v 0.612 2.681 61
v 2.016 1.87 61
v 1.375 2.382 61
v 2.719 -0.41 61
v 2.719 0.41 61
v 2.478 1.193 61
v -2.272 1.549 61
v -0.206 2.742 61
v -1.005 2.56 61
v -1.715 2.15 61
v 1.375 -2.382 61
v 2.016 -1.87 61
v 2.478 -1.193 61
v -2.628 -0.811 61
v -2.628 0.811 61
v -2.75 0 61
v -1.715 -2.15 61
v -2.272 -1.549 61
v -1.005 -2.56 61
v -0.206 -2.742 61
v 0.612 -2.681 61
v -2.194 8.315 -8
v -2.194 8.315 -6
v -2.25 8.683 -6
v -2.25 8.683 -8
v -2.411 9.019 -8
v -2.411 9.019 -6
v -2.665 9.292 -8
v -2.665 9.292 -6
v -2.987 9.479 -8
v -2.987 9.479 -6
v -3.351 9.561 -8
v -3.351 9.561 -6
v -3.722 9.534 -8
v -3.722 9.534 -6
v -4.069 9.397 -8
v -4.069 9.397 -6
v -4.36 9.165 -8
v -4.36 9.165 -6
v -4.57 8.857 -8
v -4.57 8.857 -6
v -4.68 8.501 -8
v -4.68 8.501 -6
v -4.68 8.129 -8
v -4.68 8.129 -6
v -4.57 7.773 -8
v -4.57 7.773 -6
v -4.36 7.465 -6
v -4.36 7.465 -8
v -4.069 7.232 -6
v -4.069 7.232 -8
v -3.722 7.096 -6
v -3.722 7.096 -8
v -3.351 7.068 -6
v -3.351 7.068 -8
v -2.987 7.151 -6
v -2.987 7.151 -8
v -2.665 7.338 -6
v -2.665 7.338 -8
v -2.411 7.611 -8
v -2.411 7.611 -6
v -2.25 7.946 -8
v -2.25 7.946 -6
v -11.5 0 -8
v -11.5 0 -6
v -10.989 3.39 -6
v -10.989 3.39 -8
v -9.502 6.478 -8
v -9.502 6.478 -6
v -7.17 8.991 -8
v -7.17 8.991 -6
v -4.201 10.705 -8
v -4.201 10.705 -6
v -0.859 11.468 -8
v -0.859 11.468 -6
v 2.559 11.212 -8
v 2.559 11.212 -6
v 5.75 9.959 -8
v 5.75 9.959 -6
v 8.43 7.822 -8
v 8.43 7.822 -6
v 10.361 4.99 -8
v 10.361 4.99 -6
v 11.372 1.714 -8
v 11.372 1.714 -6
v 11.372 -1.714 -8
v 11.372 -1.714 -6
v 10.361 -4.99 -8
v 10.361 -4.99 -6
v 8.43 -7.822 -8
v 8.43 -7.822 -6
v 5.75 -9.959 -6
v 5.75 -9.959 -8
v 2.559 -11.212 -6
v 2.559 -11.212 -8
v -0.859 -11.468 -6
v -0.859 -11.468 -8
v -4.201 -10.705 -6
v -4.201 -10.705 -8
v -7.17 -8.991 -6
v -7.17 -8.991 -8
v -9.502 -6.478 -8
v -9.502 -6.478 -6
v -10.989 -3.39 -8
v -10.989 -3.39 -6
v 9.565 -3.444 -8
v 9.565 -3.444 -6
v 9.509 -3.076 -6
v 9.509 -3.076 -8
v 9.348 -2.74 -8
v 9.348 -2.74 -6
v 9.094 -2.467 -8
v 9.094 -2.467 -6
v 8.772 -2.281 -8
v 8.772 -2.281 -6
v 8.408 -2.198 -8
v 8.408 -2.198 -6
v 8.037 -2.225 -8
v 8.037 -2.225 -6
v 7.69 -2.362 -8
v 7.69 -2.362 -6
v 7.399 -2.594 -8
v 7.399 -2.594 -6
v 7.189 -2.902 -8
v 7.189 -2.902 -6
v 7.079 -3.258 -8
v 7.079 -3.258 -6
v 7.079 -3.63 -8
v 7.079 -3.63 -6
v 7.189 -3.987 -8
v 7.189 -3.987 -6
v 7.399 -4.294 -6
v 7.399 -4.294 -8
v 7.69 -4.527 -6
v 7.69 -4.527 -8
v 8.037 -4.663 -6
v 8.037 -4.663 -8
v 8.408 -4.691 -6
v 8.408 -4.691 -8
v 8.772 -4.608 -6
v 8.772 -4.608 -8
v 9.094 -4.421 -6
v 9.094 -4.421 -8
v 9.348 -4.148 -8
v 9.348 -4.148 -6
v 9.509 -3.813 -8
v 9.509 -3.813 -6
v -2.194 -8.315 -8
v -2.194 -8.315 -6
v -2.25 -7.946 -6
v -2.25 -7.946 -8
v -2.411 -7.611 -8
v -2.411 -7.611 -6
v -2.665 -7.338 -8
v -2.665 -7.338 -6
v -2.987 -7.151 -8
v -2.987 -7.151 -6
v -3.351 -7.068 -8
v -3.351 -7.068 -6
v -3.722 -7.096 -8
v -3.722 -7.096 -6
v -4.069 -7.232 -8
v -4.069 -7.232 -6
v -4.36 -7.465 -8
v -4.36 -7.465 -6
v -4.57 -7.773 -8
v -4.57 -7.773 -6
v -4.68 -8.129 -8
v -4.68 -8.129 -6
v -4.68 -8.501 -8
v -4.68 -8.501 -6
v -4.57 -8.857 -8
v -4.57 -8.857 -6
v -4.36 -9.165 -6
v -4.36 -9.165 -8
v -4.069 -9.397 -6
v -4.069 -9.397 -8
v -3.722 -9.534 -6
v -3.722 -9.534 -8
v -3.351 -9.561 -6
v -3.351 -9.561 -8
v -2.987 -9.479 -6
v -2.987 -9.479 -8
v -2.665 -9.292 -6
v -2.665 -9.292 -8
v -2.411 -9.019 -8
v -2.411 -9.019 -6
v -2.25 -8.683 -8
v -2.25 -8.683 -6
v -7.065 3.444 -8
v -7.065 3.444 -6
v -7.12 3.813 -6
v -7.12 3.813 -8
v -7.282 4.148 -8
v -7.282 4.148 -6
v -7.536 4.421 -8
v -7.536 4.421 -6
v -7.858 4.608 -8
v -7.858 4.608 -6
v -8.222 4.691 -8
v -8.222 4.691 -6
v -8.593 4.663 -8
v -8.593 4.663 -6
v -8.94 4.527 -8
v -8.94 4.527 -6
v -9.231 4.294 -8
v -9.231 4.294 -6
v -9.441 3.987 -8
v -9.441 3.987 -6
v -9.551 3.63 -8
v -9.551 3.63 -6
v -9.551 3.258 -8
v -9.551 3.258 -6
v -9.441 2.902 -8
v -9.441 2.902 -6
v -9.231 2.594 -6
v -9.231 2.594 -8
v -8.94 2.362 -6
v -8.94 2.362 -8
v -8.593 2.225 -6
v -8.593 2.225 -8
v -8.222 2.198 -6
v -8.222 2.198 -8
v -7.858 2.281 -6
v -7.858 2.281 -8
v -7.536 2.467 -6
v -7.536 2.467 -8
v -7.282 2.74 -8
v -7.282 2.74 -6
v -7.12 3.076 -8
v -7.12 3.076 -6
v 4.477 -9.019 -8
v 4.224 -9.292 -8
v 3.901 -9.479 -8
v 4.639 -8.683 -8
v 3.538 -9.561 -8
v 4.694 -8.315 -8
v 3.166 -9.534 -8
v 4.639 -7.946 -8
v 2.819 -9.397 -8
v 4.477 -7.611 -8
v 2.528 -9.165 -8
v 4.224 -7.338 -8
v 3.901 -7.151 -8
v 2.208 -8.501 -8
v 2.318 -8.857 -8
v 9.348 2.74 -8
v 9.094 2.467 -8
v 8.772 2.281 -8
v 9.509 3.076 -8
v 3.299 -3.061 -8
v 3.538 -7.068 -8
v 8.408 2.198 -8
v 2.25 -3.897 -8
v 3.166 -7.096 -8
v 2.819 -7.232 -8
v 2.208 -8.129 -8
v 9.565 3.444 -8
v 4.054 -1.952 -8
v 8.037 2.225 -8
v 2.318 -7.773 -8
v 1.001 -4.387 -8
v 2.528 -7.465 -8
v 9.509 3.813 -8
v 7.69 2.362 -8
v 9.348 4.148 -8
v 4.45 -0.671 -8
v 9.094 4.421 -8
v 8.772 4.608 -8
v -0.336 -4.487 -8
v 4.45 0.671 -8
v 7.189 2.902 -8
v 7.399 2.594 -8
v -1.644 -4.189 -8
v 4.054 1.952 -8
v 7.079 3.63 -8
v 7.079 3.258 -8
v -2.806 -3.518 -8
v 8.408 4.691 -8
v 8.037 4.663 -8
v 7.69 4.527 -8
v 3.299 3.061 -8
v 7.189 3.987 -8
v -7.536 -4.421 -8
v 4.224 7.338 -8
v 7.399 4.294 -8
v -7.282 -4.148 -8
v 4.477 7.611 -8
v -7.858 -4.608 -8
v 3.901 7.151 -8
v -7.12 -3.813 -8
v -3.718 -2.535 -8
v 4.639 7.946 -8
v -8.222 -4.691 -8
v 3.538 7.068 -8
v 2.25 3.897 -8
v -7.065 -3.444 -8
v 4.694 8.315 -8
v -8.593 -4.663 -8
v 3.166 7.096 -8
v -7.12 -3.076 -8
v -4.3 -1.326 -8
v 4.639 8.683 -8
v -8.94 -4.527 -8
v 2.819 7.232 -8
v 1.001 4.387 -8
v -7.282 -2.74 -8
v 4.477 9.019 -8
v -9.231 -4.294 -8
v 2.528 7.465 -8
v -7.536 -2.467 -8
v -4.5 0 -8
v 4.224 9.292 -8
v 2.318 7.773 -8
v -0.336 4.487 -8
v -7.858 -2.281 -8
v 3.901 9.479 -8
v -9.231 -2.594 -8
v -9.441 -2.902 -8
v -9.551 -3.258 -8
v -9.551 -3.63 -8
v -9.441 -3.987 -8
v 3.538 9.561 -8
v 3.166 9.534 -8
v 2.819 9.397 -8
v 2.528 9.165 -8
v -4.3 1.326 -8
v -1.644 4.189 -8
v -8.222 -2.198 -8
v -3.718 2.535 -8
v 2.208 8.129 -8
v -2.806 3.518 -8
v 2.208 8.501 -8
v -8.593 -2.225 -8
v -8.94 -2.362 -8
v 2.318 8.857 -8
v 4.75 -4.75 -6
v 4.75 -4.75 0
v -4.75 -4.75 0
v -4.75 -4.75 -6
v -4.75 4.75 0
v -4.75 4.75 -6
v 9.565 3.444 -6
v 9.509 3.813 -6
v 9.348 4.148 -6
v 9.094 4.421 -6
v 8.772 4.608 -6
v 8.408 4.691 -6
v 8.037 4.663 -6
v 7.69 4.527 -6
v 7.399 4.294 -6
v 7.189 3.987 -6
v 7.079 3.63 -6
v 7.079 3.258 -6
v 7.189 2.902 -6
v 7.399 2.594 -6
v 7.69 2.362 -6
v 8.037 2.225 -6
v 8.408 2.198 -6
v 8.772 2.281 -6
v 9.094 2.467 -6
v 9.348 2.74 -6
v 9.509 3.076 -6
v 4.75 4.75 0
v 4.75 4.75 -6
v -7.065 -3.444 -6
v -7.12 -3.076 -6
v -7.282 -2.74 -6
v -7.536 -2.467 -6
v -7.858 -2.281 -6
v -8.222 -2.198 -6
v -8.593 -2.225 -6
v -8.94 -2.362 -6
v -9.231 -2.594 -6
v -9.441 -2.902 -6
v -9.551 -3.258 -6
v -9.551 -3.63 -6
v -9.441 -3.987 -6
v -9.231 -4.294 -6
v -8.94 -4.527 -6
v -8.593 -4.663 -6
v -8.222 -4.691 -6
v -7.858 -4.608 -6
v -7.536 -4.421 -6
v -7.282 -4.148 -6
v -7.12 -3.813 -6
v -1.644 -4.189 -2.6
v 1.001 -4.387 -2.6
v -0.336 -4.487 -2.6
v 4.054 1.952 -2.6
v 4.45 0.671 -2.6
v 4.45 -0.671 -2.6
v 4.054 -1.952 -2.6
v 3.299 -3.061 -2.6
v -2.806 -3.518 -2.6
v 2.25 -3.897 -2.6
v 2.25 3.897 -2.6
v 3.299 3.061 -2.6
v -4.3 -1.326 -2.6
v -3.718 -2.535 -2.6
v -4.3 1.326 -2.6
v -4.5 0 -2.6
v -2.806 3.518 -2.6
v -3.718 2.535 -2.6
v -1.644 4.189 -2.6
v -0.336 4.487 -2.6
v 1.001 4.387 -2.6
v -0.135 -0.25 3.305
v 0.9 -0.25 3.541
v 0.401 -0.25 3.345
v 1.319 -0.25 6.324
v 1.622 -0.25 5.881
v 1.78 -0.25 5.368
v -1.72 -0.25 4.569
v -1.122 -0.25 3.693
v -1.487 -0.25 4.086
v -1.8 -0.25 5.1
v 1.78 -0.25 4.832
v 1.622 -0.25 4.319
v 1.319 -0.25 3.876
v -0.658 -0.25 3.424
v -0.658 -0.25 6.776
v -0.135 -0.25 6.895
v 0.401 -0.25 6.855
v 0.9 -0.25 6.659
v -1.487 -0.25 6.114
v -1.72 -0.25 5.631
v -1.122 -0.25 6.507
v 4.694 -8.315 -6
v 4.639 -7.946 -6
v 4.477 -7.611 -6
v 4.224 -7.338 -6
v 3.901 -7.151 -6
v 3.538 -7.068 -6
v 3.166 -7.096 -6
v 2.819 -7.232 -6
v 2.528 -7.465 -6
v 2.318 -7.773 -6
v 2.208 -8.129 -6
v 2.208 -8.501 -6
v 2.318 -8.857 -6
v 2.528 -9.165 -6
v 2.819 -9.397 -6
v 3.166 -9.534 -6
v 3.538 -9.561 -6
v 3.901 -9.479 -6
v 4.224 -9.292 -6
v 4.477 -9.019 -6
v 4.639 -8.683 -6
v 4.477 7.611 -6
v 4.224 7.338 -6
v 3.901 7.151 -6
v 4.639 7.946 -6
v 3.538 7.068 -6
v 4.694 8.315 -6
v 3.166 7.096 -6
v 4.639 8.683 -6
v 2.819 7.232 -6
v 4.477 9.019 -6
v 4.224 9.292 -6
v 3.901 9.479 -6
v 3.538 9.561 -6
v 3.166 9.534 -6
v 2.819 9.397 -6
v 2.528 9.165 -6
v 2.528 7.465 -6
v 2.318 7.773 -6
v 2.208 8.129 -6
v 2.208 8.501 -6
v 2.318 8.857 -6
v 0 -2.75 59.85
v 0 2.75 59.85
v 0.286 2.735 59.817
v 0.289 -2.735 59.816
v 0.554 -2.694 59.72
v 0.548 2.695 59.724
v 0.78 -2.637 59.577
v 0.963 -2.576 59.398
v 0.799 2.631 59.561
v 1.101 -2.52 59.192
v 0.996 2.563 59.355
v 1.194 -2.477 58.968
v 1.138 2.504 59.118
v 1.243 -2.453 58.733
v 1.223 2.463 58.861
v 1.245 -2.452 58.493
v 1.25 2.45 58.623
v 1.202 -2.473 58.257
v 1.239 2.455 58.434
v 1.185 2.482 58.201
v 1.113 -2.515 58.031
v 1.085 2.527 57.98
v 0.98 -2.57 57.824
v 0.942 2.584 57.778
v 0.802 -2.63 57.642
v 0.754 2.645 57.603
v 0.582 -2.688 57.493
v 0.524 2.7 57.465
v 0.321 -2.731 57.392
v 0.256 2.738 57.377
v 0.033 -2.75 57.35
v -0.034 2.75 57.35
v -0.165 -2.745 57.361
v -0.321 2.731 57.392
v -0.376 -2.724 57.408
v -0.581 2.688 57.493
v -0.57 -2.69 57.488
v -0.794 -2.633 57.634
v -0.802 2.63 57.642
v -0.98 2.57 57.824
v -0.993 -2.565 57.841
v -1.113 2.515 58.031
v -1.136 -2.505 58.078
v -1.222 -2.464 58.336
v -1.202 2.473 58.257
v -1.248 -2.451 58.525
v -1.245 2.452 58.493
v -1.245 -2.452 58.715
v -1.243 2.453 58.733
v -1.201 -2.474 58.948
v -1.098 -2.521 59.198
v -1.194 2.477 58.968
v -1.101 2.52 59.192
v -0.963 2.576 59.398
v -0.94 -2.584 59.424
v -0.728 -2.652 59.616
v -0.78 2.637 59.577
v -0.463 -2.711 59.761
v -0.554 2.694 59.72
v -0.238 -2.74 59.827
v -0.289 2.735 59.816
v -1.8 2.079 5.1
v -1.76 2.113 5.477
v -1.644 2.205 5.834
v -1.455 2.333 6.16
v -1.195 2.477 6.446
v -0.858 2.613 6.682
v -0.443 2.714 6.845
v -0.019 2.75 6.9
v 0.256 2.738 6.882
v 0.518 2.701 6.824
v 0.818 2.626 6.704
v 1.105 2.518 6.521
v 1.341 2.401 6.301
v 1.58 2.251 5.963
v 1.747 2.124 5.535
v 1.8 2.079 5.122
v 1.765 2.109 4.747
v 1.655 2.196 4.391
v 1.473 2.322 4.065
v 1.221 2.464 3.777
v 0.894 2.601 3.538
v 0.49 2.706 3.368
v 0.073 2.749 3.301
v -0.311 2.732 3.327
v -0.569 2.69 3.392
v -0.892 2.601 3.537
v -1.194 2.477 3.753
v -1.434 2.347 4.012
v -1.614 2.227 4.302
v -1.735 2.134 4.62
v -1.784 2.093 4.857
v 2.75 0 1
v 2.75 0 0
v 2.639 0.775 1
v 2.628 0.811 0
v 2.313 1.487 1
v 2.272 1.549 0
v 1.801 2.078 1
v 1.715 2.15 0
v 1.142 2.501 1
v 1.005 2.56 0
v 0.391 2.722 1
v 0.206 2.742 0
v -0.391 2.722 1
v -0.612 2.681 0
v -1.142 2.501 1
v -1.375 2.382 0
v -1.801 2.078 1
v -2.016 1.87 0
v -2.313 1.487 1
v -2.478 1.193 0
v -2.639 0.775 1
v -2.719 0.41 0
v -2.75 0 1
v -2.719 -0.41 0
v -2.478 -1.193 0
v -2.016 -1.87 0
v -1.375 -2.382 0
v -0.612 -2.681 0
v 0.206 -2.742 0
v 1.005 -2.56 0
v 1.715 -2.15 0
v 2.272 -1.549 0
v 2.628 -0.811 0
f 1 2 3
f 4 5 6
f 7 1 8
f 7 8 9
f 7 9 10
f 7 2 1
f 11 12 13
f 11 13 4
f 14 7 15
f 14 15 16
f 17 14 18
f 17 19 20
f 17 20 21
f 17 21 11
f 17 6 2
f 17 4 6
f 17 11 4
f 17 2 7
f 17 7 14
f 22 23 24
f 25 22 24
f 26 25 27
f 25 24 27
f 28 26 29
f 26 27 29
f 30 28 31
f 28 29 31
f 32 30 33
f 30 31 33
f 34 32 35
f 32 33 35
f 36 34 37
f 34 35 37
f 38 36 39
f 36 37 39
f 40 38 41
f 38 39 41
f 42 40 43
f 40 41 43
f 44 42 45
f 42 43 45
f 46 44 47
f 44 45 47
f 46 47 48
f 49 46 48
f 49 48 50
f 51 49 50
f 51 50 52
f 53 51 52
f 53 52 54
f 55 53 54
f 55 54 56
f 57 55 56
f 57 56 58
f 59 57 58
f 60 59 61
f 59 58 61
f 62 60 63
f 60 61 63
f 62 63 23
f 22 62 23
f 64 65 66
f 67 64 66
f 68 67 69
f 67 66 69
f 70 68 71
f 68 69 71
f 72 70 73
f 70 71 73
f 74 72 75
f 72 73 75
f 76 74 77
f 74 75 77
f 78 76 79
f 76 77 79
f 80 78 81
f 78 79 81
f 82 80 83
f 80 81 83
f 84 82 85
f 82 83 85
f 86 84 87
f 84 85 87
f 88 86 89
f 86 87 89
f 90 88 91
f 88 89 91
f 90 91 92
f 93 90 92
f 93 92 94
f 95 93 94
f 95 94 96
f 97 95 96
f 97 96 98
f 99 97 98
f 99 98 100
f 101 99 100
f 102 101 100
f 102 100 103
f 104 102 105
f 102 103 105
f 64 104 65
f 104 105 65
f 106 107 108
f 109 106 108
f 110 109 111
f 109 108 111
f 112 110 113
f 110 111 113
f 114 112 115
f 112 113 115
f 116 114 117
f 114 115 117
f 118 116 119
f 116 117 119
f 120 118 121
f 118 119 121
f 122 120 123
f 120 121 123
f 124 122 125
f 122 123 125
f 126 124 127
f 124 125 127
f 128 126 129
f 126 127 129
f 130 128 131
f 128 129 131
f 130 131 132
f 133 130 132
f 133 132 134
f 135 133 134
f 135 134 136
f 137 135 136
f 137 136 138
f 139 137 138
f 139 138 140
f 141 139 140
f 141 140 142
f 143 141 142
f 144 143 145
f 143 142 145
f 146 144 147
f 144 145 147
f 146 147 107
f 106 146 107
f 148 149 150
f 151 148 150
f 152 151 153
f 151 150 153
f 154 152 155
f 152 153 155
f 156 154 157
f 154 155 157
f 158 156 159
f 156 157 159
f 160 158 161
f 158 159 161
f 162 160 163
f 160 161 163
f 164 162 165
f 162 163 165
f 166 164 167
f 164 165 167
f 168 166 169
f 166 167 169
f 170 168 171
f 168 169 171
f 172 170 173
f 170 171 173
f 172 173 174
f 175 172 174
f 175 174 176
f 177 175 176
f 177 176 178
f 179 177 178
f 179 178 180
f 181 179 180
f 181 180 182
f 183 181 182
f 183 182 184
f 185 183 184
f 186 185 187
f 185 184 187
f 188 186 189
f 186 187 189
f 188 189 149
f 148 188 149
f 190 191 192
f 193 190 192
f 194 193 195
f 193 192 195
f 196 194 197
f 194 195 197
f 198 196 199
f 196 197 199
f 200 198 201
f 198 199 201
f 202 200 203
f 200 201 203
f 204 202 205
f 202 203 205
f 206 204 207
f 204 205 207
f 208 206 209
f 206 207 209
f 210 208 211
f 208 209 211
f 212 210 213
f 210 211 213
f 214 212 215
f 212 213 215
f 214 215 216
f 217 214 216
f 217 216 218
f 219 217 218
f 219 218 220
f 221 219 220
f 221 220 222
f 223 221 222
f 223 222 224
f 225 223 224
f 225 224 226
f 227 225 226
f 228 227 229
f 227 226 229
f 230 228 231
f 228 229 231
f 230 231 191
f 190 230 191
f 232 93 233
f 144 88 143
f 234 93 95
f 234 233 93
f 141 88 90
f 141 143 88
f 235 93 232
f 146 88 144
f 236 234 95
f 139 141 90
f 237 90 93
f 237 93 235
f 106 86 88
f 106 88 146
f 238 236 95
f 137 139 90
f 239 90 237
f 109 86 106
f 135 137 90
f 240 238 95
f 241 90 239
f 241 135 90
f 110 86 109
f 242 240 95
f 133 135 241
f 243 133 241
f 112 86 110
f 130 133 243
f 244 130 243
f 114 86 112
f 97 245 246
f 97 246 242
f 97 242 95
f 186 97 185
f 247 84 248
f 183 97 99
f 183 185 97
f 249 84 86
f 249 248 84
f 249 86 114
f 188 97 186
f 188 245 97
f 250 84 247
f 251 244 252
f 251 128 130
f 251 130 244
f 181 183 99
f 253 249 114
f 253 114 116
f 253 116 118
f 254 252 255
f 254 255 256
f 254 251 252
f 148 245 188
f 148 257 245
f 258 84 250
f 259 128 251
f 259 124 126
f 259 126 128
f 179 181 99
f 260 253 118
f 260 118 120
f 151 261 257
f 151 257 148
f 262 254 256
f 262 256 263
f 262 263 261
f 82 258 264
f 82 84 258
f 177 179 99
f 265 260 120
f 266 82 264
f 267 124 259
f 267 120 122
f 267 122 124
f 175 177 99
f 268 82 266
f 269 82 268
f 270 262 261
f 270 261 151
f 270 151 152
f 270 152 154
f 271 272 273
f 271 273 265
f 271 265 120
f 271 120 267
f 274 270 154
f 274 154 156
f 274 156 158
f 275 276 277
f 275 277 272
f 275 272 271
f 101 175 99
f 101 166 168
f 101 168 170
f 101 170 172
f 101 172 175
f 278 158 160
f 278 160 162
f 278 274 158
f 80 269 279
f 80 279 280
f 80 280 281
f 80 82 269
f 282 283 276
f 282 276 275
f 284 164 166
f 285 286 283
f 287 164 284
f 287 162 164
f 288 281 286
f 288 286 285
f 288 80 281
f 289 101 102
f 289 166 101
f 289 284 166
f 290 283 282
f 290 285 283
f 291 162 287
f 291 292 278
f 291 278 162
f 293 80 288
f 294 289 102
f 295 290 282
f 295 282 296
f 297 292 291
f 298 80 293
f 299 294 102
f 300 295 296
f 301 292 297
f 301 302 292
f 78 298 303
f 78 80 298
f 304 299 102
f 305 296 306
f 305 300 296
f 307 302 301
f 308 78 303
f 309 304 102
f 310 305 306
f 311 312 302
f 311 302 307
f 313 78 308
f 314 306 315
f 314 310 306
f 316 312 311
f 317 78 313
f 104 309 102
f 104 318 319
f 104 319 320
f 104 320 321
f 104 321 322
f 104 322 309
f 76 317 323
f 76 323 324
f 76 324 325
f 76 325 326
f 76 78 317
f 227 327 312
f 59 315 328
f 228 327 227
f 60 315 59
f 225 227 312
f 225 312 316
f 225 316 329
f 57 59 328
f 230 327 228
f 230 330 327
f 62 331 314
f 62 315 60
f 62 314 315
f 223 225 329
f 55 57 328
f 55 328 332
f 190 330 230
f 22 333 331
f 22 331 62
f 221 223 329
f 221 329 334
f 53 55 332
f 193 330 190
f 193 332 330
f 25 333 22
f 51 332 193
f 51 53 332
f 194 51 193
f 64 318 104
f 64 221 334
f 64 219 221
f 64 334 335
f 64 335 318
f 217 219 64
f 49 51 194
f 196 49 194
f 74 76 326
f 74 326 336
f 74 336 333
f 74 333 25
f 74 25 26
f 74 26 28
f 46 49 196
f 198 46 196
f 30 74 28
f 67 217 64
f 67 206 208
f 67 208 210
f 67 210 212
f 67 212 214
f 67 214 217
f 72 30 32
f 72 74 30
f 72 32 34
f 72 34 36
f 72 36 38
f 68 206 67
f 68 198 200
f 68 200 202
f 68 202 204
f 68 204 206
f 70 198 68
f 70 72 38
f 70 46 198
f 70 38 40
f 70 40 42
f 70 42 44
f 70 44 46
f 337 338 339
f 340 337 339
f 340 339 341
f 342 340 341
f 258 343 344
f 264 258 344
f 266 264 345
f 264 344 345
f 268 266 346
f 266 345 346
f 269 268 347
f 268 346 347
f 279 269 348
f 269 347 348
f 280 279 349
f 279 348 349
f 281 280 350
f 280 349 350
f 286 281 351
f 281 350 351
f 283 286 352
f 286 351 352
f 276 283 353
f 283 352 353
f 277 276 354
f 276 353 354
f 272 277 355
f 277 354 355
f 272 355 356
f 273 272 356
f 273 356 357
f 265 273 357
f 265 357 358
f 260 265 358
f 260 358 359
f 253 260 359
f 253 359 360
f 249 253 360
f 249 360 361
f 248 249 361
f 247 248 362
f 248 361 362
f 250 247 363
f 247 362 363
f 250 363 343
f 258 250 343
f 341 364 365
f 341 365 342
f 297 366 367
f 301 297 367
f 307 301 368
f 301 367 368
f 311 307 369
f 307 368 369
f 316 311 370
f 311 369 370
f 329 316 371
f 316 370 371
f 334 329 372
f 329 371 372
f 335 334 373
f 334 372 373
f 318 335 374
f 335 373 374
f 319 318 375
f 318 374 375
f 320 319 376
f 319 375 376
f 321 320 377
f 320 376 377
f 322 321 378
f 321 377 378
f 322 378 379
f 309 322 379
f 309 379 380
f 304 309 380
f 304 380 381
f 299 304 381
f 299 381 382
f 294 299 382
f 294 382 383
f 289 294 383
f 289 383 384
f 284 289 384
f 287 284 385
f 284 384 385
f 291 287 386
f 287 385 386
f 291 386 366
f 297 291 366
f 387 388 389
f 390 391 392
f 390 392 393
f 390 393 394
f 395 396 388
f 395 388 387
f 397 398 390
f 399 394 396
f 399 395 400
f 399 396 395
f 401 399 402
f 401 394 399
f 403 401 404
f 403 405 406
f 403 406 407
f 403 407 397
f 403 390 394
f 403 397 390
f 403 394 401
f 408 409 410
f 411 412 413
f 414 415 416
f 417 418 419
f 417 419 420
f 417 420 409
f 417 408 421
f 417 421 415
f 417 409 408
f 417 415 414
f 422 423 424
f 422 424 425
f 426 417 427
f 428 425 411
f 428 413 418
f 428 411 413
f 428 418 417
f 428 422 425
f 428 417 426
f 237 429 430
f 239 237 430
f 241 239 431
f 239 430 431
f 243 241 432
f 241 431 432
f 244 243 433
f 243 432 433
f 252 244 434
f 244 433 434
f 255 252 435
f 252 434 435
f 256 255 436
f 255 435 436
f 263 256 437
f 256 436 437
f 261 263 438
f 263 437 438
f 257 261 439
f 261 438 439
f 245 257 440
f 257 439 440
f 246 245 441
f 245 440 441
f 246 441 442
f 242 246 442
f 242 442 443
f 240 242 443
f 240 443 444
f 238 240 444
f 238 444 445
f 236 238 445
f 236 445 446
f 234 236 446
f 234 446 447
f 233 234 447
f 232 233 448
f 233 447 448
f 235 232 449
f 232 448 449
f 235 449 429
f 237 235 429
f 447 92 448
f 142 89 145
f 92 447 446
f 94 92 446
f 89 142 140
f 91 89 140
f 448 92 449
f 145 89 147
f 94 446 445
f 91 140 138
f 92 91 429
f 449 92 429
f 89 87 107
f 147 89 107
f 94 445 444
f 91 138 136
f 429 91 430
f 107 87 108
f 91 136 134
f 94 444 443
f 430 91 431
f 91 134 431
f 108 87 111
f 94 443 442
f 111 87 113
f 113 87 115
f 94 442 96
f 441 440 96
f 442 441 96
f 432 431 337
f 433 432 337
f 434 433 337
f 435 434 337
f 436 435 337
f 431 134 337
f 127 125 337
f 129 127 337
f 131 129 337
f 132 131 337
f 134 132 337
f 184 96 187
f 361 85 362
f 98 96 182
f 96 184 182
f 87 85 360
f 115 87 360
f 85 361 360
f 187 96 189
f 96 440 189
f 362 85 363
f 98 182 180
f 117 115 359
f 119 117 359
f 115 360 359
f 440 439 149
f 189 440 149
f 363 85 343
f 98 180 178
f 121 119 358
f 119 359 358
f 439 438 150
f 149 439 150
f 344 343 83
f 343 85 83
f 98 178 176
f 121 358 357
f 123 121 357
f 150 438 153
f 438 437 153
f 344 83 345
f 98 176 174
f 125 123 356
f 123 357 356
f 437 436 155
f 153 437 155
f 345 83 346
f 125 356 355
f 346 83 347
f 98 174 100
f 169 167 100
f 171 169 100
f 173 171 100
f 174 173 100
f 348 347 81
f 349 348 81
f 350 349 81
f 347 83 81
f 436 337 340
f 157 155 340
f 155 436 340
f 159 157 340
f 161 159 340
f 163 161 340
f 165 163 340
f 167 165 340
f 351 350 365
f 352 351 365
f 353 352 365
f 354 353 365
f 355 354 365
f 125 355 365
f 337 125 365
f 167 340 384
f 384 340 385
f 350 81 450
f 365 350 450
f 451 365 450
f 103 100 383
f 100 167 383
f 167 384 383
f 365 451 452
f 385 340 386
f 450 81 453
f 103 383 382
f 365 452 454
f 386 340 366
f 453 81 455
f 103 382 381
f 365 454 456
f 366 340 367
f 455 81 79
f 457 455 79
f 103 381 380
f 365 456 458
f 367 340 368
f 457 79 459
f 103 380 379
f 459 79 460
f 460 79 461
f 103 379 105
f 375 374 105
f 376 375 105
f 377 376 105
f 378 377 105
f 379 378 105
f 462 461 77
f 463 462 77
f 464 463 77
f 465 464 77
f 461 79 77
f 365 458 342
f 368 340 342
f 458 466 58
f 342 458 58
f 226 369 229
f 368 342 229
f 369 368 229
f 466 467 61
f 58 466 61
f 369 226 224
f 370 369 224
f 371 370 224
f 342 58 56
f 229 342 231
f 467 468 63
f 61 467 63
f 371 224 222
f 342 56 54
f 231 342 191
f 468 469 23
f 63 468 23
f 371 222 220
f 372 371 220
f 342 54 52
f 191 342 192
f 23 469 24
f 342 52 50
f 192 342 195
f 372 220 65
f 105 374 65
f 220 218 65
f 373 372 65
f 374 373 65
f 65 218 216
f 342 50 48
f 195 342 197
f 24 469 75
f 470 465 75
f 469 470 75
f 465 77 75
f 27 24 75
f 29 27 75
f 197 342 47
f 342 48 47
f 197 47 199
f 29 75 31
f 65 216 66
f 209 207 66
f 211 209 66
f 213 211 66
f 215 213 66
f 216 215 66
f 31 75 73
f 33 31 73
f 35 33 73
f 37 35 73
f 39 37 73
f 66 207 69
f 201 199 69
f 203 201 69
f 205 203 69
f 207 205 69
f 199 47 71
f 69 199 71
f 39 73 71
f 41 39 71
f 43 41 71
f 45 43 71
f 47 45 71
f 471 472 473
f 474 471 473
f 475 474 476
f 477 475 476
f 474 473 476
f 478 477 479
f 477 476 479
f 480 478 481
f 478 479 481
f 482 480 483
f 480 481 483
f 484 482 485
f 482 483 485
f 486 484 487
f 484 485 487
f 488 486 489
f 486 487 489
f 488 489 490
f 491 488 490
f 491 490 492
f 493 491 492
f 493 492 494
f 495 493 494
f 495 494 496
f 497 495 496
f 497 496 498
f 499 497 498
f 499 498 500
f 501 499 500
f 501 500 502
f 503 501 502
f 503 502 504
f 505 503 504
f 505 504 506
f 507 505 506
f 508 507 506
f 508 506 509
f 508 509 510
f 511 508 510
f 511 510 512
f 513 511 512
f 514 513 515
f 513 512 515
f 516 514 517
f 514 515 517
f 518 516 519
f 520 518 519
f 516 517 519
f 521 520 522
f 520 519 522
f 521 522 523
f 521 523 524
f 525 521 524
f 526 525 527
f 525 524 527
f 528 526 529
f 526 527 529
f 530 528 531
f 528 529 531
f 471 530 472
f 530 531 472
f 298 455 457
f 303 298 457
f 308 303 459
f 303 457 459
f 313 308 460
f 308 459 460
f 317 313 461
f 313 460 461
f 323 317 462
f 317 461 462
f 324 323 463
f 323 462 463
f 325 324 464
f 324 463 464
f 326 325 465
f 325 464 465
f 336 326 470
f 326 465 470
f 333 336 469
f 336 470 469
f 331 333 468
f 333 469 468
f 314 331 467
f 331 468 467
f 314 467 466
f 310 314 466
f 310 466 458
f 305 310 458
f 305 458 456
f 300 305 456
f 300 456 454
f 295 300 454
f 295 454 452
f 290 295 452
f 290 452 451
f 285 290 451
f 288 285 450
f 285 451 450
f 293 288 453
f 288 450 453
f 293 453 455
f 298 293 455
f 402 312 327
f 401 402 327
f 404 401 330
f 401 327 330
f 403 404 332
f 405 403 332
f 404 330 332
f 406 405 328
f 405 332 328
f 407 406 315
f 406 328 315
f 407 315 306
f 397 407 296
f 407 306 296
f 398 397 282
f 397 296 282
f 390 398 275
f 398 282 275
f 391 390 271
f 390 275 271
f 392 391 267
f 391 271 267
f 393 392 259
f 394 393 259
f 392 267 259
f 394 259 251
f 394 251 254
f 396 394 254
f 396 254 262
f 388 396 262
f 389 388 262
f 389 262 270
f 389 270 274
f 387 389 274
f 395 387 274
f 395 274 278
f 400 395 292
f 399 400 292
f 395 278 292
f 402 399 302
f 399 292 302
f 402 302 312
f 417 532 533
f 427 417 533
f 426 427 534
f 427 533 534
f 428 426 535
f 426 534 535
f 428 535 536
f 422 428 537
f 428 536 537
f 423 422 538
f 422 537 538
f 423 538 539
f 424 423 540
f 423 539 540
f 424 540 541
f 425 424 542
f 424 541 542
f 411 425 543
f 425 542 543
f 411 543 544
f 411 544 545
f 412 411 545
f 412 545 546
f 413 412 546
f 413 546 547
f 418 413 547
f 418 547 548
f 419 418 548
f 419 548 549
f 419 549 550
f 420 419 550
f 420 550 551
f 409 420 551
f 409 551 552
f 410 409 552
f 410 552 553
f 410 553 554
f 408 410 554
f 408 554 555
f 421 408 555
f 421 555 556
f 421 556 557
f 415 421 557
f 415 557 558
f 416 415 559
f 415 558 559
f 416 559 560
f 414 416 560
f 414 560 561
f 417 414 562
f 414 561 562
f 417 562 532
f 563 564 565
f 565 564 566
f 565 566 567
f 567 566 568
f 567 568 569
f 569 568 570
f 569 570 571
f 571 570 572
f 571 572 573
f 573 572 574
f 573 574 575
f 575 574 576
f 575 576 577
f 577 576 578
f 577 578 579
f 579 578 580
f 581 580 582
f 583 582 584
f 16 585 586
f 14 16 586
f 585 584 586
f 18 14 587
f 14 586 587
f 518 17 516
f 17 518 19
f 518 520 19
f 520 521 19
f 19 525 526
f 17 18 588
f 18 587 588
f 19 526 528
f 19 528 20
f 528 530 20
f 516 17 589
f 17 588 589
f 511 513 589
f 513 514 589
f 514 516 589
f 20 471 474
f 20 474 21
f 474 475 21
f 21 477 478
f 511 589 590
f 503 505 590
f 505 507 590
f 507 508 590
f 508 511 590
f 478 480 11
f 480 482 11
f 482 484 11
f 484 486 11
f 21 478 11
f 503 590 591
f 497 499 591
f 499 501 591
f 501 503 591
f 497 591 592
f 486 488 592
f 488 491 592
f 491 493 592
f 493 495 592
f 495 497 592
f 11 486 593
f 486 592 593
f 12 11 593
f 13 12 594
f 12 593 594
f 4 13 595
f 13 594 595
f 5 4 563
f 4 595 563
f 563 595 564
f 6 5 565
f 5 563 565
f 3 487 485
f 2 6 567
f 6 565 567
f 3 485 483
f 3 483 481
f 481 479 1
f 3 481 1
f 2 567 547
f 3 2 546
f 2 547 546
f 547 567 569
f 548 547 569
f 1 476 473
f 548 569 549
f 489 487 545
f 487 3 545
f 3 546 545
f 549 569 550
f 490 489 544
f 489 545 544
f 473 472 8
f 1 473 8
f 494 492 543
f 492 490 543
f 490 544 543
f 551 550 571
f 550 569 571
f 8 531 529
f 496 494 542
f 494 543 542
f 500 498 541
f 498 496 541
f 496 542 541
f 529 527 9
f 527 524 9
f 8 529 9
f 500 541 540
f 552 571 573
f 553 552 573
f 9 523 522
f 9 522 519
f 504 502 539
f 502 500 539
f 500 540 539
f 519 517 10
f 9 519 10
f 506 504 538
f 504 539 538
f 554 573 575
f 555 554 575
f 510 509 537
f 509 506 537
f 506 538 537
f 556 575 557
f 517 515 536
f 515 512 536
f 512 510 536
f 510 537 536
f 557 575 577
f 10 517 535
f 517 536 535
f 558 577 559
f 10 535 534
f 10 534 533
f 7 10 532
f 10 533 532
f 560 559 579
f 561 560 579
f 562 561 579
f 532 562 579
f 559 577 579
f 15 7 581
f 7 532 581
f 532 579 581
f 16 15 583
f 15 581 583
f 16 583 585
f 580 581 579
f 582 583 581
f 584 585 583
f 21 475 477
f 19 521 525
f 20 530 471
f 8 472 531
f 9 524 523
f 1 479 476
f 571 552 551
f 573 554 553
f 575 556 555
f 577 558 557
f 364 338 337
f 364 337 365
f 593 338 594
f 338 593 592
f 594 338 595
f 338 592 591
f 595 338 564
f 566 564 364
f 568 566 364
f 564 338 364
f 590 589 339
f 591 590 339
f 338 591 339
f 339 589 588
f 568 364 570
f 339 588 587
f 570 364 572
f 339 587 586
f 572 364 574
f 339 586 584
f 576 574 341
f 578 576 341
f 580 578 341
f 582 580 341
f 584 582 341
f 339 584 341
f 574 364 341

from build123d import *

# Parameters (mm, degrees)
SKETCH_1_R           = 2.75
EXTRUDE_1_DEPTH      = 1
SKETCH_3_W           = 9.5
SKETCH_3_H           = 9.5
EXTRUDE_2_DEPTH      = 6
SKETCH_12_W          = 9.5
SKETCH_12_H          = 9.5
EXTRUDE_5_DEPTH      = 45
SKETCH_15_W          = 5.9
SKETCH_15_H          = 20.04910328
EXTRUDE_6_DEPTH      = 6
SKETCH_17_R          = 1.8
CUT_EXTRUDE_9_DEPTH  = 5
SKETCH_18_OUTSIDE_W  = 23.92
SKETCH_18_OUTSIDE_H  = 34.47
SKETCH_18_OUTSIDE_R  = 2.75
CUT_EXTRUDE_10_DEPTH = 60
SKETCH_19_R          = 11.5
EXTRUDE_7_DEPTH      = 2
SKETCH_20_R          = 1.25
CUT_EXTRUDE_11_DEPTH = 2
SKETCH_21_R          = 4.5
CUT_EXTRUDE_13_DEPTH = 5.4
SKETCH_22_R          = 2.75
EXTRUDE_8_DEPTH      = 12
CUT_EXTRUDE_START    = -3
SKETCH_24_R          = 2.75
CUT_EXTRUDE_15_DEPTH = 3
SKETCH_25_R          = 1.25
CUT_EXTRUDE_16_DEPTH = 9


with BuildPart() as part:
    # 스케치1 → 보스-돌출1 (new body)
    with BuildSketch(Plane.XY):
        Circle(SKETCH_1_R)
    extrude(amount=EXTRUDE_1_DEPTH)

    # 스케치3 → 보스-돌출2 (add)
    with BuildSketch(Plane(origin=(0, 0, 0), x_dir=(-1, 0, 0), z_dir=(0, 0, -1))):
        Rectangle(SKETCH_3_W, SKETCH_3_H)
    extrude(amount=EXTRUDE_2_DEPTH)

    # 스케치12 → 보스-돌출5 (add)
    with BuildSketch(Plane.XY.offset(1)):
        Rectangle(SKETCH_12_W, SKETCH_12_H)
    extrude(amount=EXTRUDE_5_DEPTH)

    # 스케치15 → 보스-돌출6 (add)
    with BuildSketch(Plane.XY.offset(46)):
        Rectangle(SKETCH_15_W, SKETCH_15_H)
    extrude(amount=EXTRUDE_6_DEPTH)

    # 스케치17 → 컷-돌출9 (cut)
    with BuildSketch(Plane(origin=(0, 4.75, 0), x_dir=(1, 0, 0), z_dir=(0, 1, 0))):
        with Locations(Location((0, -5.1, 0), (0, 0, 180))):
            Circle(SKETCH_17_R)
    extrude(amount=-CUT_EXTRUDE_9_DEPTH, mode=Mode.SUBTRACT)

    # 스케치18 outside → 컷-돌출10 (cut)
    with BuildSketch(Plane(origin=(0, 0, 1), x_dir=(-1, 0, 0), z_dir=(0, 0, -1))):
        Rectangle(SKETCH_18_OUTSIDE_W, SKETCH_18_OUTSIDE_H)
        Circle(SKETCH_18_OUTSIDE_R, mode=Mode.SUBTRACT)
    extrude(amount=-CUT_EXTRUDE_10_DEPTH, mode=Mode.SUBTRACT)

    # 스케치19 → 보스-돌출7 (add)
    with BuildSketch(Plane(origin=(0, 0, -6), x_dir=(-1, 0, 0), z_dir=(0, 0, -1))):
        Circle(SKETCH_19_R)
    extrude(amount=EXTRUDE_7_DEPTH)

    # 스케치20 → 컷-돌출11 (cut)
    with BuildSketch(Plane.XY.offset(-6)):
        with Locations((3.444150891, 8.314915793)):
            Circle(SKETCH_20_R)
        with Locations((8.314915793, 3.444150891)):
            Circle(SKETCH_20_R)
        with Locations((8.314915793, -3.444150891)):
            Circle(SKETCH_20_R)
        with Locations((3.444150891, -8.314915793)):
            Circle(SKETCH_20_R)
        with Locations((-3.444150891, -8.314915793)):
            Circle(SKETCH_20_R)
        with Locations((-8.314915793, -3.444150891)):
            Circle(SKETCH_20_R)
        with Locations((-8.314915793, 3.444150891)):
            Circle(SKETCH_20_R)
        with Locations((-3.444150891, 8.314915793)):
            Circle(SKETCH_20_R)
    extrude(amount=-CUT_EXTRUDE_11_DEPTH, mode=Mode.SUBTRACT)

    # 스케치21 → 컷-돌출13 (cut)
    with BuildSketch(Plane(origin=(0, 0, -8), x_dir=(-1, 0, 0), z_dir=(0, 0, -1))):
        Circle(SKETCH_21_R)
    extrude(amount=-CUT_EXTRUDE_13_DEPTH, mode=Mode.SUBTRACT)

    # 스케치22 → 보스-돌출8 (add)
    with BuildSketch(Plane.XY.offset(52)):
        with Locations(Location((0, 0, 0), (0, 0, 180))):
            Circle(SKETCH_22_R)
    extrude(amount=EXTRUDE_8_DEPTH)

    # 스케치24 → 컷-돌출15 (cut)
    with BuildSketch(Plane.XY.offset(64).offset(CUT_EXTRUDE_START)):
        with Locations(Location((0, 0, 0), (0, 0, 180))):
            Circle(SKETCH_24_R)
    extrude(amount=CUT_EXTRUDE_15_DEPTH, mode=Mode.SUBTRACT)

    # 스케치25 → 컷-돌출16 (cut)
    with BuildSketch(Plane(origin=(0, 2.75, 0), x_dir=(1, 0, 0), z_dir=(0, 1, 0))):
        with Locations(Location((0, -58.6, 0), (0, 0, 270))):
            Circle(SKETCH_25_R)
    extrude(amount=-CUT_EXTRUDE_16_DEPTH, mode=Mode.SUBTRACT)


solid = part.part
